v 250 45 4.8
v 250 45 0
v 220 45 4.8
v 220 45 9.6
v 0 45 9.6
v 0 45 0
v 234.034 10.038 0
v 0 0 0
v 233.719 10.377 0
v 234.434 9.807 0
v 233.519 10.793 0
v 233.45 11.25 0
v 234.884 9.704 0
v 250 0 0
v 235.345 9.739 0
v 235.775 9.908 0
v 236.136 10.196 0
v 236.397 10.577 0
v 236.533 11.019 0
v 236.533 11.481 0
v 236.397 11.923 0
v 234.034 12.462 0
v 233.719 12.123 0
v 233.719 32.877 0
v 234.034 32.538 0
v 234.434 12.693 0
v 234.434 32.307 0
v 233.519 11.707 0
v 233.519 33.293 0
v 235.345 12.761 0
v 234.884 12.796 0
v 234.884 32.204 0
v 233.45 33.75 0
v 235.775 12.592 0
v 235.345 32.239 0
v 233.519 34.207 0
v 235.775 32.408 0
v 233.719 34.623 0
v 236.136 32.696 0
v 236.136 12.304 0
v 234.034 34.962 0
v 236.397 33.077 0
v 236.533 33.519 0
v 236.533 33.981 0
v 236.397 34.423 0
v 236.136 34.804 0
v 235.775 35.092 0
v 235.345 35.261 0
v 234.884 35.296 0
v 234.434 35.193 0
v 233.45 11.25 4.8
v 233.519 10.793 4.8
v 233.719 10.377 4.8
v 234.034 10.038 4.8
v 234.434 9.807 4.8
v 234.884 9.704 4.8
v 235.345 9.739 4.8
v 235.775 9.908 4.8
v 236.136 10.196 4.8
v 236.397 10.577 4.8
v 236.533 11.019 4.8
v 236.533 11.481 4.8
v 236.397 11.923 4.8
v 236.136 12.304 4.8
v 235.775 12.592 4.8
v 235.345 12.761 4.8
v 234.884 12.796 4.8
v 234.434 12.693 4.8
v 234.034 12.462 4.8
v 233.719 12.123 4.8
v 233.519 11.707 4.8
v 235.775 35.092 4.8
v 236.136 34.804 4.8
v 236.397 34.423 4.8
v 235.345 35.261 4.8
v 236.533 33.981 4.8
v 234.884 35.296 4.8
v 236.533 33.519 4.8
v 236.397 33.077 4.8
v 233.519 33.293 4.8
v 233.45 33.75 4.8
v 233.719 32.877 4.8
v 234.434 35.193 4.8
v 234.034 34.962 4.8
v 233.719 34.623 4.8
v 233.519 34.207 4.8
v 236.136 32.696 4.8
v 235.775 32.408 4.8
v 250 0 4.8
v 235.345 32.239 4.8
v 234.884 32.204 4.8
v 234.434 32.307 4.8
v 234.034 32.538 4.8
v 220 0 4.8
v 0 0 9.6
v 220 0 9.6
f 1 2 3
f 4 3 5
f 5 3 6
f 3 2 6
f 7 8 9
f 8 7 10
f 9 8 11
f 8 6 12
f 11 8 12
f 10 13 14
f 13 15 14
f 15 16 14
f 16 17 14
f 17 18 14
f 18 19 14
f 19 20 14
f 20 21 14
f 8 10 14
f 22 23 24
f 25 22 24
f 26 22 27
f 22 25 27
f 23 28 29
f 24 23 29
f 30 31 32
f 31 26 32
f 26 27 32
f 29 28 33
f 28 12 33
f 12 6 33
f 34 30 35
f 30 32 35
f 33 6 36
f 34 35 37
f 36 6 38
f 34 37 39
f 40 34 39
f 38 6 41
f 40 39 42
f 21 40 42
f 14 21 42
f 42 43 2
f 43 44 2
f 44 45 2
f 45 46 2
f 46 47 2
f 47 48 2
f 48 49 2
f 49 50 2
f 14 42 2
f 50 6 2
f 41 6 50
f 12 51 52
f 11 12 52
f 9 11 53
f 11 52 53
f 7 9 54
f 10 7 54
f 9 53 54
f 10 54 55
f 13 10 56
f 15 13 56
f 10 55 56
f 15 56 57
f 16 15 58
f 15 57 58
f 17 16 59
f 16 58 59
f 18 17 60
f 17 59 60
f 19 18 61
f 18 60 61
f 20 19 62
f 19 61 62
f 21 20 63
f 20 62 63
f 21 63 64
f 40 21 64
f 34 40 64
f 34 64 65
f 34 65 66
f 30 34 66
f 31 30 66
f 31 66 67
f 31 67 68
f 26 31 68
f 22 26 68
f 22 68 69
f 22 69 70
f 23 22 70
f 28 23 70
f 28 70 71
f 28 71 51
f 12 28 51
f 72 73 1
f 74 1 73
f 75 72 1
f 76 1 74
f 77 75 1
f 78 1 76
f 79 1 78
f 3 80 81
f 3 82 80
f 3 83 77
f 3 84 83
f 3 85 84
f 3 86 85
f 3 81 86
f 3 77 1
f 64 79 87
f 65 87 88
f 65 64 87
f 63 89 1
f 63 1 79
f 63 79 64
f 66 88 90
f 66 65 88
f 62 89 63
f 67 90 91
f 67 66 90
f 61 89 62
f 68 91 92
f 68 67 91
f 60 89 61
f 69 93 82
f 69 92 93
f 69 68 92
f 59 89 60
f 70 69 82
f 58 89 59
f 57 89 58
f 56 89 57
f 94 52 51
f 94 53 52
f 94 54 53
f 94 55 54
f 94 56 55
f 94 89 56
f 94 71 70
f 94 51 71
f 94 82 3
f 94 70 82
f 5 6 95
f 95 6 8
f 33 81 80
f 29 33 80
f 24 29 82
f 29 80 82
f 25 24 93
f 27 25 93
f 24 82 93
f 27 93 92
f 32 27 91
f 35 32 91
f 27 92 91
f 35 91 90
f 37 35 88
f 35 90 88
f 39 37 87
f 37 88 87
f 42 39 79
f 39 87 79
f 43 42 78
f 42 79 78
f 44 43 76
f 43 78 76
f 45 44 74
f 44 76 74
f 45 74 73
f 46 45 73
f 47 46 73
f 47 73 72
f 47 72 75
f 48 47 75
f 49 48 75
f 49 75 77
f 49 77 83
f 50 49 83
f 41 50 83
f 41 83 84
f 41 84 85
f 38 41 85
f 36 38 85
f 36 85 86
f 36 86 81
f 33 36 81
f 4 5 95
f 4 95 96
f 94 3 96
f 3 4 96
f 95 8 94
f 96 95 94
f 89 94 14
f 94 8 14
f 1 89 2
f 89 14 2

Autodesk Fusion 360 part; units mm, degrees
sketch "Sketch1" plane through (0, 0, 0) normal (0, 0, 1) x (1, 0, 0)
  line L0 (0, 0) -> (250, 0)
  line L1 (250, 0) -> (250, 45)
  line L2 (250, 45) -> (0, 45)
  line L3 (0, 45) -> (0, 0)
  dimension "d1" = 250
  dimension "d2" = 45
extrude "Extrude1" add sketch "Sketch1" along normal blind 9.5
extrude "Extrude2" add 1 faces at (83.3333, 30, 9.5) along direction (0, 0, 1) blind 0.1
sketch "Sketch2" plane through (0, 0, 9.6) normal (0, 0, 1) x (-1, 0, 0)
  line L0 (0, -45) -> (0, 0)
  line L1 (0, 0) -> (-250, 0)
  line L2 (-250, 0) -> (-250, -45)
  line L3 (-250, -45) -> (0, -45)
  line L4 (-250, -45) -> (-220, -45)
  line L5 (-220, -45) -> (-220, 0)
  line L6 (-220, 0) -> (-250, 0)
  line L7 (-250, 0) -> (-250, -45)
  dimension "d7" = 30
extrude "Extrude3" cut sketch "Sketch2" against normal blind 4.8 contours L1 L2 L3 L4 L5 L6 L7
sketch "Sketch3" plane through (0, 0, 4.8) normal (0, 0, 1) x (-1, 0, 0)
  line L0 (-250, 0) -> (-250, -45)
  line L1 (-250, -45) -> (-220, -45)
  line L2 (-220, -45) -> (-220, 0)
  line L3 (-220, 0) -> (-250, 0)
  circle A0 centre (-235, -33.75) radius 1.55
  circle A1 centre (-235, -11.25) radius 1.55
  dimension "d10" = 3.1
  dimension "d11" = 3.1
extrude "Extrude4" cut sketch "Sketch3" against normal blind 23 contours A0 | A1
equation "d8 = ( -9.6 / 2 ) * 1 mm"
